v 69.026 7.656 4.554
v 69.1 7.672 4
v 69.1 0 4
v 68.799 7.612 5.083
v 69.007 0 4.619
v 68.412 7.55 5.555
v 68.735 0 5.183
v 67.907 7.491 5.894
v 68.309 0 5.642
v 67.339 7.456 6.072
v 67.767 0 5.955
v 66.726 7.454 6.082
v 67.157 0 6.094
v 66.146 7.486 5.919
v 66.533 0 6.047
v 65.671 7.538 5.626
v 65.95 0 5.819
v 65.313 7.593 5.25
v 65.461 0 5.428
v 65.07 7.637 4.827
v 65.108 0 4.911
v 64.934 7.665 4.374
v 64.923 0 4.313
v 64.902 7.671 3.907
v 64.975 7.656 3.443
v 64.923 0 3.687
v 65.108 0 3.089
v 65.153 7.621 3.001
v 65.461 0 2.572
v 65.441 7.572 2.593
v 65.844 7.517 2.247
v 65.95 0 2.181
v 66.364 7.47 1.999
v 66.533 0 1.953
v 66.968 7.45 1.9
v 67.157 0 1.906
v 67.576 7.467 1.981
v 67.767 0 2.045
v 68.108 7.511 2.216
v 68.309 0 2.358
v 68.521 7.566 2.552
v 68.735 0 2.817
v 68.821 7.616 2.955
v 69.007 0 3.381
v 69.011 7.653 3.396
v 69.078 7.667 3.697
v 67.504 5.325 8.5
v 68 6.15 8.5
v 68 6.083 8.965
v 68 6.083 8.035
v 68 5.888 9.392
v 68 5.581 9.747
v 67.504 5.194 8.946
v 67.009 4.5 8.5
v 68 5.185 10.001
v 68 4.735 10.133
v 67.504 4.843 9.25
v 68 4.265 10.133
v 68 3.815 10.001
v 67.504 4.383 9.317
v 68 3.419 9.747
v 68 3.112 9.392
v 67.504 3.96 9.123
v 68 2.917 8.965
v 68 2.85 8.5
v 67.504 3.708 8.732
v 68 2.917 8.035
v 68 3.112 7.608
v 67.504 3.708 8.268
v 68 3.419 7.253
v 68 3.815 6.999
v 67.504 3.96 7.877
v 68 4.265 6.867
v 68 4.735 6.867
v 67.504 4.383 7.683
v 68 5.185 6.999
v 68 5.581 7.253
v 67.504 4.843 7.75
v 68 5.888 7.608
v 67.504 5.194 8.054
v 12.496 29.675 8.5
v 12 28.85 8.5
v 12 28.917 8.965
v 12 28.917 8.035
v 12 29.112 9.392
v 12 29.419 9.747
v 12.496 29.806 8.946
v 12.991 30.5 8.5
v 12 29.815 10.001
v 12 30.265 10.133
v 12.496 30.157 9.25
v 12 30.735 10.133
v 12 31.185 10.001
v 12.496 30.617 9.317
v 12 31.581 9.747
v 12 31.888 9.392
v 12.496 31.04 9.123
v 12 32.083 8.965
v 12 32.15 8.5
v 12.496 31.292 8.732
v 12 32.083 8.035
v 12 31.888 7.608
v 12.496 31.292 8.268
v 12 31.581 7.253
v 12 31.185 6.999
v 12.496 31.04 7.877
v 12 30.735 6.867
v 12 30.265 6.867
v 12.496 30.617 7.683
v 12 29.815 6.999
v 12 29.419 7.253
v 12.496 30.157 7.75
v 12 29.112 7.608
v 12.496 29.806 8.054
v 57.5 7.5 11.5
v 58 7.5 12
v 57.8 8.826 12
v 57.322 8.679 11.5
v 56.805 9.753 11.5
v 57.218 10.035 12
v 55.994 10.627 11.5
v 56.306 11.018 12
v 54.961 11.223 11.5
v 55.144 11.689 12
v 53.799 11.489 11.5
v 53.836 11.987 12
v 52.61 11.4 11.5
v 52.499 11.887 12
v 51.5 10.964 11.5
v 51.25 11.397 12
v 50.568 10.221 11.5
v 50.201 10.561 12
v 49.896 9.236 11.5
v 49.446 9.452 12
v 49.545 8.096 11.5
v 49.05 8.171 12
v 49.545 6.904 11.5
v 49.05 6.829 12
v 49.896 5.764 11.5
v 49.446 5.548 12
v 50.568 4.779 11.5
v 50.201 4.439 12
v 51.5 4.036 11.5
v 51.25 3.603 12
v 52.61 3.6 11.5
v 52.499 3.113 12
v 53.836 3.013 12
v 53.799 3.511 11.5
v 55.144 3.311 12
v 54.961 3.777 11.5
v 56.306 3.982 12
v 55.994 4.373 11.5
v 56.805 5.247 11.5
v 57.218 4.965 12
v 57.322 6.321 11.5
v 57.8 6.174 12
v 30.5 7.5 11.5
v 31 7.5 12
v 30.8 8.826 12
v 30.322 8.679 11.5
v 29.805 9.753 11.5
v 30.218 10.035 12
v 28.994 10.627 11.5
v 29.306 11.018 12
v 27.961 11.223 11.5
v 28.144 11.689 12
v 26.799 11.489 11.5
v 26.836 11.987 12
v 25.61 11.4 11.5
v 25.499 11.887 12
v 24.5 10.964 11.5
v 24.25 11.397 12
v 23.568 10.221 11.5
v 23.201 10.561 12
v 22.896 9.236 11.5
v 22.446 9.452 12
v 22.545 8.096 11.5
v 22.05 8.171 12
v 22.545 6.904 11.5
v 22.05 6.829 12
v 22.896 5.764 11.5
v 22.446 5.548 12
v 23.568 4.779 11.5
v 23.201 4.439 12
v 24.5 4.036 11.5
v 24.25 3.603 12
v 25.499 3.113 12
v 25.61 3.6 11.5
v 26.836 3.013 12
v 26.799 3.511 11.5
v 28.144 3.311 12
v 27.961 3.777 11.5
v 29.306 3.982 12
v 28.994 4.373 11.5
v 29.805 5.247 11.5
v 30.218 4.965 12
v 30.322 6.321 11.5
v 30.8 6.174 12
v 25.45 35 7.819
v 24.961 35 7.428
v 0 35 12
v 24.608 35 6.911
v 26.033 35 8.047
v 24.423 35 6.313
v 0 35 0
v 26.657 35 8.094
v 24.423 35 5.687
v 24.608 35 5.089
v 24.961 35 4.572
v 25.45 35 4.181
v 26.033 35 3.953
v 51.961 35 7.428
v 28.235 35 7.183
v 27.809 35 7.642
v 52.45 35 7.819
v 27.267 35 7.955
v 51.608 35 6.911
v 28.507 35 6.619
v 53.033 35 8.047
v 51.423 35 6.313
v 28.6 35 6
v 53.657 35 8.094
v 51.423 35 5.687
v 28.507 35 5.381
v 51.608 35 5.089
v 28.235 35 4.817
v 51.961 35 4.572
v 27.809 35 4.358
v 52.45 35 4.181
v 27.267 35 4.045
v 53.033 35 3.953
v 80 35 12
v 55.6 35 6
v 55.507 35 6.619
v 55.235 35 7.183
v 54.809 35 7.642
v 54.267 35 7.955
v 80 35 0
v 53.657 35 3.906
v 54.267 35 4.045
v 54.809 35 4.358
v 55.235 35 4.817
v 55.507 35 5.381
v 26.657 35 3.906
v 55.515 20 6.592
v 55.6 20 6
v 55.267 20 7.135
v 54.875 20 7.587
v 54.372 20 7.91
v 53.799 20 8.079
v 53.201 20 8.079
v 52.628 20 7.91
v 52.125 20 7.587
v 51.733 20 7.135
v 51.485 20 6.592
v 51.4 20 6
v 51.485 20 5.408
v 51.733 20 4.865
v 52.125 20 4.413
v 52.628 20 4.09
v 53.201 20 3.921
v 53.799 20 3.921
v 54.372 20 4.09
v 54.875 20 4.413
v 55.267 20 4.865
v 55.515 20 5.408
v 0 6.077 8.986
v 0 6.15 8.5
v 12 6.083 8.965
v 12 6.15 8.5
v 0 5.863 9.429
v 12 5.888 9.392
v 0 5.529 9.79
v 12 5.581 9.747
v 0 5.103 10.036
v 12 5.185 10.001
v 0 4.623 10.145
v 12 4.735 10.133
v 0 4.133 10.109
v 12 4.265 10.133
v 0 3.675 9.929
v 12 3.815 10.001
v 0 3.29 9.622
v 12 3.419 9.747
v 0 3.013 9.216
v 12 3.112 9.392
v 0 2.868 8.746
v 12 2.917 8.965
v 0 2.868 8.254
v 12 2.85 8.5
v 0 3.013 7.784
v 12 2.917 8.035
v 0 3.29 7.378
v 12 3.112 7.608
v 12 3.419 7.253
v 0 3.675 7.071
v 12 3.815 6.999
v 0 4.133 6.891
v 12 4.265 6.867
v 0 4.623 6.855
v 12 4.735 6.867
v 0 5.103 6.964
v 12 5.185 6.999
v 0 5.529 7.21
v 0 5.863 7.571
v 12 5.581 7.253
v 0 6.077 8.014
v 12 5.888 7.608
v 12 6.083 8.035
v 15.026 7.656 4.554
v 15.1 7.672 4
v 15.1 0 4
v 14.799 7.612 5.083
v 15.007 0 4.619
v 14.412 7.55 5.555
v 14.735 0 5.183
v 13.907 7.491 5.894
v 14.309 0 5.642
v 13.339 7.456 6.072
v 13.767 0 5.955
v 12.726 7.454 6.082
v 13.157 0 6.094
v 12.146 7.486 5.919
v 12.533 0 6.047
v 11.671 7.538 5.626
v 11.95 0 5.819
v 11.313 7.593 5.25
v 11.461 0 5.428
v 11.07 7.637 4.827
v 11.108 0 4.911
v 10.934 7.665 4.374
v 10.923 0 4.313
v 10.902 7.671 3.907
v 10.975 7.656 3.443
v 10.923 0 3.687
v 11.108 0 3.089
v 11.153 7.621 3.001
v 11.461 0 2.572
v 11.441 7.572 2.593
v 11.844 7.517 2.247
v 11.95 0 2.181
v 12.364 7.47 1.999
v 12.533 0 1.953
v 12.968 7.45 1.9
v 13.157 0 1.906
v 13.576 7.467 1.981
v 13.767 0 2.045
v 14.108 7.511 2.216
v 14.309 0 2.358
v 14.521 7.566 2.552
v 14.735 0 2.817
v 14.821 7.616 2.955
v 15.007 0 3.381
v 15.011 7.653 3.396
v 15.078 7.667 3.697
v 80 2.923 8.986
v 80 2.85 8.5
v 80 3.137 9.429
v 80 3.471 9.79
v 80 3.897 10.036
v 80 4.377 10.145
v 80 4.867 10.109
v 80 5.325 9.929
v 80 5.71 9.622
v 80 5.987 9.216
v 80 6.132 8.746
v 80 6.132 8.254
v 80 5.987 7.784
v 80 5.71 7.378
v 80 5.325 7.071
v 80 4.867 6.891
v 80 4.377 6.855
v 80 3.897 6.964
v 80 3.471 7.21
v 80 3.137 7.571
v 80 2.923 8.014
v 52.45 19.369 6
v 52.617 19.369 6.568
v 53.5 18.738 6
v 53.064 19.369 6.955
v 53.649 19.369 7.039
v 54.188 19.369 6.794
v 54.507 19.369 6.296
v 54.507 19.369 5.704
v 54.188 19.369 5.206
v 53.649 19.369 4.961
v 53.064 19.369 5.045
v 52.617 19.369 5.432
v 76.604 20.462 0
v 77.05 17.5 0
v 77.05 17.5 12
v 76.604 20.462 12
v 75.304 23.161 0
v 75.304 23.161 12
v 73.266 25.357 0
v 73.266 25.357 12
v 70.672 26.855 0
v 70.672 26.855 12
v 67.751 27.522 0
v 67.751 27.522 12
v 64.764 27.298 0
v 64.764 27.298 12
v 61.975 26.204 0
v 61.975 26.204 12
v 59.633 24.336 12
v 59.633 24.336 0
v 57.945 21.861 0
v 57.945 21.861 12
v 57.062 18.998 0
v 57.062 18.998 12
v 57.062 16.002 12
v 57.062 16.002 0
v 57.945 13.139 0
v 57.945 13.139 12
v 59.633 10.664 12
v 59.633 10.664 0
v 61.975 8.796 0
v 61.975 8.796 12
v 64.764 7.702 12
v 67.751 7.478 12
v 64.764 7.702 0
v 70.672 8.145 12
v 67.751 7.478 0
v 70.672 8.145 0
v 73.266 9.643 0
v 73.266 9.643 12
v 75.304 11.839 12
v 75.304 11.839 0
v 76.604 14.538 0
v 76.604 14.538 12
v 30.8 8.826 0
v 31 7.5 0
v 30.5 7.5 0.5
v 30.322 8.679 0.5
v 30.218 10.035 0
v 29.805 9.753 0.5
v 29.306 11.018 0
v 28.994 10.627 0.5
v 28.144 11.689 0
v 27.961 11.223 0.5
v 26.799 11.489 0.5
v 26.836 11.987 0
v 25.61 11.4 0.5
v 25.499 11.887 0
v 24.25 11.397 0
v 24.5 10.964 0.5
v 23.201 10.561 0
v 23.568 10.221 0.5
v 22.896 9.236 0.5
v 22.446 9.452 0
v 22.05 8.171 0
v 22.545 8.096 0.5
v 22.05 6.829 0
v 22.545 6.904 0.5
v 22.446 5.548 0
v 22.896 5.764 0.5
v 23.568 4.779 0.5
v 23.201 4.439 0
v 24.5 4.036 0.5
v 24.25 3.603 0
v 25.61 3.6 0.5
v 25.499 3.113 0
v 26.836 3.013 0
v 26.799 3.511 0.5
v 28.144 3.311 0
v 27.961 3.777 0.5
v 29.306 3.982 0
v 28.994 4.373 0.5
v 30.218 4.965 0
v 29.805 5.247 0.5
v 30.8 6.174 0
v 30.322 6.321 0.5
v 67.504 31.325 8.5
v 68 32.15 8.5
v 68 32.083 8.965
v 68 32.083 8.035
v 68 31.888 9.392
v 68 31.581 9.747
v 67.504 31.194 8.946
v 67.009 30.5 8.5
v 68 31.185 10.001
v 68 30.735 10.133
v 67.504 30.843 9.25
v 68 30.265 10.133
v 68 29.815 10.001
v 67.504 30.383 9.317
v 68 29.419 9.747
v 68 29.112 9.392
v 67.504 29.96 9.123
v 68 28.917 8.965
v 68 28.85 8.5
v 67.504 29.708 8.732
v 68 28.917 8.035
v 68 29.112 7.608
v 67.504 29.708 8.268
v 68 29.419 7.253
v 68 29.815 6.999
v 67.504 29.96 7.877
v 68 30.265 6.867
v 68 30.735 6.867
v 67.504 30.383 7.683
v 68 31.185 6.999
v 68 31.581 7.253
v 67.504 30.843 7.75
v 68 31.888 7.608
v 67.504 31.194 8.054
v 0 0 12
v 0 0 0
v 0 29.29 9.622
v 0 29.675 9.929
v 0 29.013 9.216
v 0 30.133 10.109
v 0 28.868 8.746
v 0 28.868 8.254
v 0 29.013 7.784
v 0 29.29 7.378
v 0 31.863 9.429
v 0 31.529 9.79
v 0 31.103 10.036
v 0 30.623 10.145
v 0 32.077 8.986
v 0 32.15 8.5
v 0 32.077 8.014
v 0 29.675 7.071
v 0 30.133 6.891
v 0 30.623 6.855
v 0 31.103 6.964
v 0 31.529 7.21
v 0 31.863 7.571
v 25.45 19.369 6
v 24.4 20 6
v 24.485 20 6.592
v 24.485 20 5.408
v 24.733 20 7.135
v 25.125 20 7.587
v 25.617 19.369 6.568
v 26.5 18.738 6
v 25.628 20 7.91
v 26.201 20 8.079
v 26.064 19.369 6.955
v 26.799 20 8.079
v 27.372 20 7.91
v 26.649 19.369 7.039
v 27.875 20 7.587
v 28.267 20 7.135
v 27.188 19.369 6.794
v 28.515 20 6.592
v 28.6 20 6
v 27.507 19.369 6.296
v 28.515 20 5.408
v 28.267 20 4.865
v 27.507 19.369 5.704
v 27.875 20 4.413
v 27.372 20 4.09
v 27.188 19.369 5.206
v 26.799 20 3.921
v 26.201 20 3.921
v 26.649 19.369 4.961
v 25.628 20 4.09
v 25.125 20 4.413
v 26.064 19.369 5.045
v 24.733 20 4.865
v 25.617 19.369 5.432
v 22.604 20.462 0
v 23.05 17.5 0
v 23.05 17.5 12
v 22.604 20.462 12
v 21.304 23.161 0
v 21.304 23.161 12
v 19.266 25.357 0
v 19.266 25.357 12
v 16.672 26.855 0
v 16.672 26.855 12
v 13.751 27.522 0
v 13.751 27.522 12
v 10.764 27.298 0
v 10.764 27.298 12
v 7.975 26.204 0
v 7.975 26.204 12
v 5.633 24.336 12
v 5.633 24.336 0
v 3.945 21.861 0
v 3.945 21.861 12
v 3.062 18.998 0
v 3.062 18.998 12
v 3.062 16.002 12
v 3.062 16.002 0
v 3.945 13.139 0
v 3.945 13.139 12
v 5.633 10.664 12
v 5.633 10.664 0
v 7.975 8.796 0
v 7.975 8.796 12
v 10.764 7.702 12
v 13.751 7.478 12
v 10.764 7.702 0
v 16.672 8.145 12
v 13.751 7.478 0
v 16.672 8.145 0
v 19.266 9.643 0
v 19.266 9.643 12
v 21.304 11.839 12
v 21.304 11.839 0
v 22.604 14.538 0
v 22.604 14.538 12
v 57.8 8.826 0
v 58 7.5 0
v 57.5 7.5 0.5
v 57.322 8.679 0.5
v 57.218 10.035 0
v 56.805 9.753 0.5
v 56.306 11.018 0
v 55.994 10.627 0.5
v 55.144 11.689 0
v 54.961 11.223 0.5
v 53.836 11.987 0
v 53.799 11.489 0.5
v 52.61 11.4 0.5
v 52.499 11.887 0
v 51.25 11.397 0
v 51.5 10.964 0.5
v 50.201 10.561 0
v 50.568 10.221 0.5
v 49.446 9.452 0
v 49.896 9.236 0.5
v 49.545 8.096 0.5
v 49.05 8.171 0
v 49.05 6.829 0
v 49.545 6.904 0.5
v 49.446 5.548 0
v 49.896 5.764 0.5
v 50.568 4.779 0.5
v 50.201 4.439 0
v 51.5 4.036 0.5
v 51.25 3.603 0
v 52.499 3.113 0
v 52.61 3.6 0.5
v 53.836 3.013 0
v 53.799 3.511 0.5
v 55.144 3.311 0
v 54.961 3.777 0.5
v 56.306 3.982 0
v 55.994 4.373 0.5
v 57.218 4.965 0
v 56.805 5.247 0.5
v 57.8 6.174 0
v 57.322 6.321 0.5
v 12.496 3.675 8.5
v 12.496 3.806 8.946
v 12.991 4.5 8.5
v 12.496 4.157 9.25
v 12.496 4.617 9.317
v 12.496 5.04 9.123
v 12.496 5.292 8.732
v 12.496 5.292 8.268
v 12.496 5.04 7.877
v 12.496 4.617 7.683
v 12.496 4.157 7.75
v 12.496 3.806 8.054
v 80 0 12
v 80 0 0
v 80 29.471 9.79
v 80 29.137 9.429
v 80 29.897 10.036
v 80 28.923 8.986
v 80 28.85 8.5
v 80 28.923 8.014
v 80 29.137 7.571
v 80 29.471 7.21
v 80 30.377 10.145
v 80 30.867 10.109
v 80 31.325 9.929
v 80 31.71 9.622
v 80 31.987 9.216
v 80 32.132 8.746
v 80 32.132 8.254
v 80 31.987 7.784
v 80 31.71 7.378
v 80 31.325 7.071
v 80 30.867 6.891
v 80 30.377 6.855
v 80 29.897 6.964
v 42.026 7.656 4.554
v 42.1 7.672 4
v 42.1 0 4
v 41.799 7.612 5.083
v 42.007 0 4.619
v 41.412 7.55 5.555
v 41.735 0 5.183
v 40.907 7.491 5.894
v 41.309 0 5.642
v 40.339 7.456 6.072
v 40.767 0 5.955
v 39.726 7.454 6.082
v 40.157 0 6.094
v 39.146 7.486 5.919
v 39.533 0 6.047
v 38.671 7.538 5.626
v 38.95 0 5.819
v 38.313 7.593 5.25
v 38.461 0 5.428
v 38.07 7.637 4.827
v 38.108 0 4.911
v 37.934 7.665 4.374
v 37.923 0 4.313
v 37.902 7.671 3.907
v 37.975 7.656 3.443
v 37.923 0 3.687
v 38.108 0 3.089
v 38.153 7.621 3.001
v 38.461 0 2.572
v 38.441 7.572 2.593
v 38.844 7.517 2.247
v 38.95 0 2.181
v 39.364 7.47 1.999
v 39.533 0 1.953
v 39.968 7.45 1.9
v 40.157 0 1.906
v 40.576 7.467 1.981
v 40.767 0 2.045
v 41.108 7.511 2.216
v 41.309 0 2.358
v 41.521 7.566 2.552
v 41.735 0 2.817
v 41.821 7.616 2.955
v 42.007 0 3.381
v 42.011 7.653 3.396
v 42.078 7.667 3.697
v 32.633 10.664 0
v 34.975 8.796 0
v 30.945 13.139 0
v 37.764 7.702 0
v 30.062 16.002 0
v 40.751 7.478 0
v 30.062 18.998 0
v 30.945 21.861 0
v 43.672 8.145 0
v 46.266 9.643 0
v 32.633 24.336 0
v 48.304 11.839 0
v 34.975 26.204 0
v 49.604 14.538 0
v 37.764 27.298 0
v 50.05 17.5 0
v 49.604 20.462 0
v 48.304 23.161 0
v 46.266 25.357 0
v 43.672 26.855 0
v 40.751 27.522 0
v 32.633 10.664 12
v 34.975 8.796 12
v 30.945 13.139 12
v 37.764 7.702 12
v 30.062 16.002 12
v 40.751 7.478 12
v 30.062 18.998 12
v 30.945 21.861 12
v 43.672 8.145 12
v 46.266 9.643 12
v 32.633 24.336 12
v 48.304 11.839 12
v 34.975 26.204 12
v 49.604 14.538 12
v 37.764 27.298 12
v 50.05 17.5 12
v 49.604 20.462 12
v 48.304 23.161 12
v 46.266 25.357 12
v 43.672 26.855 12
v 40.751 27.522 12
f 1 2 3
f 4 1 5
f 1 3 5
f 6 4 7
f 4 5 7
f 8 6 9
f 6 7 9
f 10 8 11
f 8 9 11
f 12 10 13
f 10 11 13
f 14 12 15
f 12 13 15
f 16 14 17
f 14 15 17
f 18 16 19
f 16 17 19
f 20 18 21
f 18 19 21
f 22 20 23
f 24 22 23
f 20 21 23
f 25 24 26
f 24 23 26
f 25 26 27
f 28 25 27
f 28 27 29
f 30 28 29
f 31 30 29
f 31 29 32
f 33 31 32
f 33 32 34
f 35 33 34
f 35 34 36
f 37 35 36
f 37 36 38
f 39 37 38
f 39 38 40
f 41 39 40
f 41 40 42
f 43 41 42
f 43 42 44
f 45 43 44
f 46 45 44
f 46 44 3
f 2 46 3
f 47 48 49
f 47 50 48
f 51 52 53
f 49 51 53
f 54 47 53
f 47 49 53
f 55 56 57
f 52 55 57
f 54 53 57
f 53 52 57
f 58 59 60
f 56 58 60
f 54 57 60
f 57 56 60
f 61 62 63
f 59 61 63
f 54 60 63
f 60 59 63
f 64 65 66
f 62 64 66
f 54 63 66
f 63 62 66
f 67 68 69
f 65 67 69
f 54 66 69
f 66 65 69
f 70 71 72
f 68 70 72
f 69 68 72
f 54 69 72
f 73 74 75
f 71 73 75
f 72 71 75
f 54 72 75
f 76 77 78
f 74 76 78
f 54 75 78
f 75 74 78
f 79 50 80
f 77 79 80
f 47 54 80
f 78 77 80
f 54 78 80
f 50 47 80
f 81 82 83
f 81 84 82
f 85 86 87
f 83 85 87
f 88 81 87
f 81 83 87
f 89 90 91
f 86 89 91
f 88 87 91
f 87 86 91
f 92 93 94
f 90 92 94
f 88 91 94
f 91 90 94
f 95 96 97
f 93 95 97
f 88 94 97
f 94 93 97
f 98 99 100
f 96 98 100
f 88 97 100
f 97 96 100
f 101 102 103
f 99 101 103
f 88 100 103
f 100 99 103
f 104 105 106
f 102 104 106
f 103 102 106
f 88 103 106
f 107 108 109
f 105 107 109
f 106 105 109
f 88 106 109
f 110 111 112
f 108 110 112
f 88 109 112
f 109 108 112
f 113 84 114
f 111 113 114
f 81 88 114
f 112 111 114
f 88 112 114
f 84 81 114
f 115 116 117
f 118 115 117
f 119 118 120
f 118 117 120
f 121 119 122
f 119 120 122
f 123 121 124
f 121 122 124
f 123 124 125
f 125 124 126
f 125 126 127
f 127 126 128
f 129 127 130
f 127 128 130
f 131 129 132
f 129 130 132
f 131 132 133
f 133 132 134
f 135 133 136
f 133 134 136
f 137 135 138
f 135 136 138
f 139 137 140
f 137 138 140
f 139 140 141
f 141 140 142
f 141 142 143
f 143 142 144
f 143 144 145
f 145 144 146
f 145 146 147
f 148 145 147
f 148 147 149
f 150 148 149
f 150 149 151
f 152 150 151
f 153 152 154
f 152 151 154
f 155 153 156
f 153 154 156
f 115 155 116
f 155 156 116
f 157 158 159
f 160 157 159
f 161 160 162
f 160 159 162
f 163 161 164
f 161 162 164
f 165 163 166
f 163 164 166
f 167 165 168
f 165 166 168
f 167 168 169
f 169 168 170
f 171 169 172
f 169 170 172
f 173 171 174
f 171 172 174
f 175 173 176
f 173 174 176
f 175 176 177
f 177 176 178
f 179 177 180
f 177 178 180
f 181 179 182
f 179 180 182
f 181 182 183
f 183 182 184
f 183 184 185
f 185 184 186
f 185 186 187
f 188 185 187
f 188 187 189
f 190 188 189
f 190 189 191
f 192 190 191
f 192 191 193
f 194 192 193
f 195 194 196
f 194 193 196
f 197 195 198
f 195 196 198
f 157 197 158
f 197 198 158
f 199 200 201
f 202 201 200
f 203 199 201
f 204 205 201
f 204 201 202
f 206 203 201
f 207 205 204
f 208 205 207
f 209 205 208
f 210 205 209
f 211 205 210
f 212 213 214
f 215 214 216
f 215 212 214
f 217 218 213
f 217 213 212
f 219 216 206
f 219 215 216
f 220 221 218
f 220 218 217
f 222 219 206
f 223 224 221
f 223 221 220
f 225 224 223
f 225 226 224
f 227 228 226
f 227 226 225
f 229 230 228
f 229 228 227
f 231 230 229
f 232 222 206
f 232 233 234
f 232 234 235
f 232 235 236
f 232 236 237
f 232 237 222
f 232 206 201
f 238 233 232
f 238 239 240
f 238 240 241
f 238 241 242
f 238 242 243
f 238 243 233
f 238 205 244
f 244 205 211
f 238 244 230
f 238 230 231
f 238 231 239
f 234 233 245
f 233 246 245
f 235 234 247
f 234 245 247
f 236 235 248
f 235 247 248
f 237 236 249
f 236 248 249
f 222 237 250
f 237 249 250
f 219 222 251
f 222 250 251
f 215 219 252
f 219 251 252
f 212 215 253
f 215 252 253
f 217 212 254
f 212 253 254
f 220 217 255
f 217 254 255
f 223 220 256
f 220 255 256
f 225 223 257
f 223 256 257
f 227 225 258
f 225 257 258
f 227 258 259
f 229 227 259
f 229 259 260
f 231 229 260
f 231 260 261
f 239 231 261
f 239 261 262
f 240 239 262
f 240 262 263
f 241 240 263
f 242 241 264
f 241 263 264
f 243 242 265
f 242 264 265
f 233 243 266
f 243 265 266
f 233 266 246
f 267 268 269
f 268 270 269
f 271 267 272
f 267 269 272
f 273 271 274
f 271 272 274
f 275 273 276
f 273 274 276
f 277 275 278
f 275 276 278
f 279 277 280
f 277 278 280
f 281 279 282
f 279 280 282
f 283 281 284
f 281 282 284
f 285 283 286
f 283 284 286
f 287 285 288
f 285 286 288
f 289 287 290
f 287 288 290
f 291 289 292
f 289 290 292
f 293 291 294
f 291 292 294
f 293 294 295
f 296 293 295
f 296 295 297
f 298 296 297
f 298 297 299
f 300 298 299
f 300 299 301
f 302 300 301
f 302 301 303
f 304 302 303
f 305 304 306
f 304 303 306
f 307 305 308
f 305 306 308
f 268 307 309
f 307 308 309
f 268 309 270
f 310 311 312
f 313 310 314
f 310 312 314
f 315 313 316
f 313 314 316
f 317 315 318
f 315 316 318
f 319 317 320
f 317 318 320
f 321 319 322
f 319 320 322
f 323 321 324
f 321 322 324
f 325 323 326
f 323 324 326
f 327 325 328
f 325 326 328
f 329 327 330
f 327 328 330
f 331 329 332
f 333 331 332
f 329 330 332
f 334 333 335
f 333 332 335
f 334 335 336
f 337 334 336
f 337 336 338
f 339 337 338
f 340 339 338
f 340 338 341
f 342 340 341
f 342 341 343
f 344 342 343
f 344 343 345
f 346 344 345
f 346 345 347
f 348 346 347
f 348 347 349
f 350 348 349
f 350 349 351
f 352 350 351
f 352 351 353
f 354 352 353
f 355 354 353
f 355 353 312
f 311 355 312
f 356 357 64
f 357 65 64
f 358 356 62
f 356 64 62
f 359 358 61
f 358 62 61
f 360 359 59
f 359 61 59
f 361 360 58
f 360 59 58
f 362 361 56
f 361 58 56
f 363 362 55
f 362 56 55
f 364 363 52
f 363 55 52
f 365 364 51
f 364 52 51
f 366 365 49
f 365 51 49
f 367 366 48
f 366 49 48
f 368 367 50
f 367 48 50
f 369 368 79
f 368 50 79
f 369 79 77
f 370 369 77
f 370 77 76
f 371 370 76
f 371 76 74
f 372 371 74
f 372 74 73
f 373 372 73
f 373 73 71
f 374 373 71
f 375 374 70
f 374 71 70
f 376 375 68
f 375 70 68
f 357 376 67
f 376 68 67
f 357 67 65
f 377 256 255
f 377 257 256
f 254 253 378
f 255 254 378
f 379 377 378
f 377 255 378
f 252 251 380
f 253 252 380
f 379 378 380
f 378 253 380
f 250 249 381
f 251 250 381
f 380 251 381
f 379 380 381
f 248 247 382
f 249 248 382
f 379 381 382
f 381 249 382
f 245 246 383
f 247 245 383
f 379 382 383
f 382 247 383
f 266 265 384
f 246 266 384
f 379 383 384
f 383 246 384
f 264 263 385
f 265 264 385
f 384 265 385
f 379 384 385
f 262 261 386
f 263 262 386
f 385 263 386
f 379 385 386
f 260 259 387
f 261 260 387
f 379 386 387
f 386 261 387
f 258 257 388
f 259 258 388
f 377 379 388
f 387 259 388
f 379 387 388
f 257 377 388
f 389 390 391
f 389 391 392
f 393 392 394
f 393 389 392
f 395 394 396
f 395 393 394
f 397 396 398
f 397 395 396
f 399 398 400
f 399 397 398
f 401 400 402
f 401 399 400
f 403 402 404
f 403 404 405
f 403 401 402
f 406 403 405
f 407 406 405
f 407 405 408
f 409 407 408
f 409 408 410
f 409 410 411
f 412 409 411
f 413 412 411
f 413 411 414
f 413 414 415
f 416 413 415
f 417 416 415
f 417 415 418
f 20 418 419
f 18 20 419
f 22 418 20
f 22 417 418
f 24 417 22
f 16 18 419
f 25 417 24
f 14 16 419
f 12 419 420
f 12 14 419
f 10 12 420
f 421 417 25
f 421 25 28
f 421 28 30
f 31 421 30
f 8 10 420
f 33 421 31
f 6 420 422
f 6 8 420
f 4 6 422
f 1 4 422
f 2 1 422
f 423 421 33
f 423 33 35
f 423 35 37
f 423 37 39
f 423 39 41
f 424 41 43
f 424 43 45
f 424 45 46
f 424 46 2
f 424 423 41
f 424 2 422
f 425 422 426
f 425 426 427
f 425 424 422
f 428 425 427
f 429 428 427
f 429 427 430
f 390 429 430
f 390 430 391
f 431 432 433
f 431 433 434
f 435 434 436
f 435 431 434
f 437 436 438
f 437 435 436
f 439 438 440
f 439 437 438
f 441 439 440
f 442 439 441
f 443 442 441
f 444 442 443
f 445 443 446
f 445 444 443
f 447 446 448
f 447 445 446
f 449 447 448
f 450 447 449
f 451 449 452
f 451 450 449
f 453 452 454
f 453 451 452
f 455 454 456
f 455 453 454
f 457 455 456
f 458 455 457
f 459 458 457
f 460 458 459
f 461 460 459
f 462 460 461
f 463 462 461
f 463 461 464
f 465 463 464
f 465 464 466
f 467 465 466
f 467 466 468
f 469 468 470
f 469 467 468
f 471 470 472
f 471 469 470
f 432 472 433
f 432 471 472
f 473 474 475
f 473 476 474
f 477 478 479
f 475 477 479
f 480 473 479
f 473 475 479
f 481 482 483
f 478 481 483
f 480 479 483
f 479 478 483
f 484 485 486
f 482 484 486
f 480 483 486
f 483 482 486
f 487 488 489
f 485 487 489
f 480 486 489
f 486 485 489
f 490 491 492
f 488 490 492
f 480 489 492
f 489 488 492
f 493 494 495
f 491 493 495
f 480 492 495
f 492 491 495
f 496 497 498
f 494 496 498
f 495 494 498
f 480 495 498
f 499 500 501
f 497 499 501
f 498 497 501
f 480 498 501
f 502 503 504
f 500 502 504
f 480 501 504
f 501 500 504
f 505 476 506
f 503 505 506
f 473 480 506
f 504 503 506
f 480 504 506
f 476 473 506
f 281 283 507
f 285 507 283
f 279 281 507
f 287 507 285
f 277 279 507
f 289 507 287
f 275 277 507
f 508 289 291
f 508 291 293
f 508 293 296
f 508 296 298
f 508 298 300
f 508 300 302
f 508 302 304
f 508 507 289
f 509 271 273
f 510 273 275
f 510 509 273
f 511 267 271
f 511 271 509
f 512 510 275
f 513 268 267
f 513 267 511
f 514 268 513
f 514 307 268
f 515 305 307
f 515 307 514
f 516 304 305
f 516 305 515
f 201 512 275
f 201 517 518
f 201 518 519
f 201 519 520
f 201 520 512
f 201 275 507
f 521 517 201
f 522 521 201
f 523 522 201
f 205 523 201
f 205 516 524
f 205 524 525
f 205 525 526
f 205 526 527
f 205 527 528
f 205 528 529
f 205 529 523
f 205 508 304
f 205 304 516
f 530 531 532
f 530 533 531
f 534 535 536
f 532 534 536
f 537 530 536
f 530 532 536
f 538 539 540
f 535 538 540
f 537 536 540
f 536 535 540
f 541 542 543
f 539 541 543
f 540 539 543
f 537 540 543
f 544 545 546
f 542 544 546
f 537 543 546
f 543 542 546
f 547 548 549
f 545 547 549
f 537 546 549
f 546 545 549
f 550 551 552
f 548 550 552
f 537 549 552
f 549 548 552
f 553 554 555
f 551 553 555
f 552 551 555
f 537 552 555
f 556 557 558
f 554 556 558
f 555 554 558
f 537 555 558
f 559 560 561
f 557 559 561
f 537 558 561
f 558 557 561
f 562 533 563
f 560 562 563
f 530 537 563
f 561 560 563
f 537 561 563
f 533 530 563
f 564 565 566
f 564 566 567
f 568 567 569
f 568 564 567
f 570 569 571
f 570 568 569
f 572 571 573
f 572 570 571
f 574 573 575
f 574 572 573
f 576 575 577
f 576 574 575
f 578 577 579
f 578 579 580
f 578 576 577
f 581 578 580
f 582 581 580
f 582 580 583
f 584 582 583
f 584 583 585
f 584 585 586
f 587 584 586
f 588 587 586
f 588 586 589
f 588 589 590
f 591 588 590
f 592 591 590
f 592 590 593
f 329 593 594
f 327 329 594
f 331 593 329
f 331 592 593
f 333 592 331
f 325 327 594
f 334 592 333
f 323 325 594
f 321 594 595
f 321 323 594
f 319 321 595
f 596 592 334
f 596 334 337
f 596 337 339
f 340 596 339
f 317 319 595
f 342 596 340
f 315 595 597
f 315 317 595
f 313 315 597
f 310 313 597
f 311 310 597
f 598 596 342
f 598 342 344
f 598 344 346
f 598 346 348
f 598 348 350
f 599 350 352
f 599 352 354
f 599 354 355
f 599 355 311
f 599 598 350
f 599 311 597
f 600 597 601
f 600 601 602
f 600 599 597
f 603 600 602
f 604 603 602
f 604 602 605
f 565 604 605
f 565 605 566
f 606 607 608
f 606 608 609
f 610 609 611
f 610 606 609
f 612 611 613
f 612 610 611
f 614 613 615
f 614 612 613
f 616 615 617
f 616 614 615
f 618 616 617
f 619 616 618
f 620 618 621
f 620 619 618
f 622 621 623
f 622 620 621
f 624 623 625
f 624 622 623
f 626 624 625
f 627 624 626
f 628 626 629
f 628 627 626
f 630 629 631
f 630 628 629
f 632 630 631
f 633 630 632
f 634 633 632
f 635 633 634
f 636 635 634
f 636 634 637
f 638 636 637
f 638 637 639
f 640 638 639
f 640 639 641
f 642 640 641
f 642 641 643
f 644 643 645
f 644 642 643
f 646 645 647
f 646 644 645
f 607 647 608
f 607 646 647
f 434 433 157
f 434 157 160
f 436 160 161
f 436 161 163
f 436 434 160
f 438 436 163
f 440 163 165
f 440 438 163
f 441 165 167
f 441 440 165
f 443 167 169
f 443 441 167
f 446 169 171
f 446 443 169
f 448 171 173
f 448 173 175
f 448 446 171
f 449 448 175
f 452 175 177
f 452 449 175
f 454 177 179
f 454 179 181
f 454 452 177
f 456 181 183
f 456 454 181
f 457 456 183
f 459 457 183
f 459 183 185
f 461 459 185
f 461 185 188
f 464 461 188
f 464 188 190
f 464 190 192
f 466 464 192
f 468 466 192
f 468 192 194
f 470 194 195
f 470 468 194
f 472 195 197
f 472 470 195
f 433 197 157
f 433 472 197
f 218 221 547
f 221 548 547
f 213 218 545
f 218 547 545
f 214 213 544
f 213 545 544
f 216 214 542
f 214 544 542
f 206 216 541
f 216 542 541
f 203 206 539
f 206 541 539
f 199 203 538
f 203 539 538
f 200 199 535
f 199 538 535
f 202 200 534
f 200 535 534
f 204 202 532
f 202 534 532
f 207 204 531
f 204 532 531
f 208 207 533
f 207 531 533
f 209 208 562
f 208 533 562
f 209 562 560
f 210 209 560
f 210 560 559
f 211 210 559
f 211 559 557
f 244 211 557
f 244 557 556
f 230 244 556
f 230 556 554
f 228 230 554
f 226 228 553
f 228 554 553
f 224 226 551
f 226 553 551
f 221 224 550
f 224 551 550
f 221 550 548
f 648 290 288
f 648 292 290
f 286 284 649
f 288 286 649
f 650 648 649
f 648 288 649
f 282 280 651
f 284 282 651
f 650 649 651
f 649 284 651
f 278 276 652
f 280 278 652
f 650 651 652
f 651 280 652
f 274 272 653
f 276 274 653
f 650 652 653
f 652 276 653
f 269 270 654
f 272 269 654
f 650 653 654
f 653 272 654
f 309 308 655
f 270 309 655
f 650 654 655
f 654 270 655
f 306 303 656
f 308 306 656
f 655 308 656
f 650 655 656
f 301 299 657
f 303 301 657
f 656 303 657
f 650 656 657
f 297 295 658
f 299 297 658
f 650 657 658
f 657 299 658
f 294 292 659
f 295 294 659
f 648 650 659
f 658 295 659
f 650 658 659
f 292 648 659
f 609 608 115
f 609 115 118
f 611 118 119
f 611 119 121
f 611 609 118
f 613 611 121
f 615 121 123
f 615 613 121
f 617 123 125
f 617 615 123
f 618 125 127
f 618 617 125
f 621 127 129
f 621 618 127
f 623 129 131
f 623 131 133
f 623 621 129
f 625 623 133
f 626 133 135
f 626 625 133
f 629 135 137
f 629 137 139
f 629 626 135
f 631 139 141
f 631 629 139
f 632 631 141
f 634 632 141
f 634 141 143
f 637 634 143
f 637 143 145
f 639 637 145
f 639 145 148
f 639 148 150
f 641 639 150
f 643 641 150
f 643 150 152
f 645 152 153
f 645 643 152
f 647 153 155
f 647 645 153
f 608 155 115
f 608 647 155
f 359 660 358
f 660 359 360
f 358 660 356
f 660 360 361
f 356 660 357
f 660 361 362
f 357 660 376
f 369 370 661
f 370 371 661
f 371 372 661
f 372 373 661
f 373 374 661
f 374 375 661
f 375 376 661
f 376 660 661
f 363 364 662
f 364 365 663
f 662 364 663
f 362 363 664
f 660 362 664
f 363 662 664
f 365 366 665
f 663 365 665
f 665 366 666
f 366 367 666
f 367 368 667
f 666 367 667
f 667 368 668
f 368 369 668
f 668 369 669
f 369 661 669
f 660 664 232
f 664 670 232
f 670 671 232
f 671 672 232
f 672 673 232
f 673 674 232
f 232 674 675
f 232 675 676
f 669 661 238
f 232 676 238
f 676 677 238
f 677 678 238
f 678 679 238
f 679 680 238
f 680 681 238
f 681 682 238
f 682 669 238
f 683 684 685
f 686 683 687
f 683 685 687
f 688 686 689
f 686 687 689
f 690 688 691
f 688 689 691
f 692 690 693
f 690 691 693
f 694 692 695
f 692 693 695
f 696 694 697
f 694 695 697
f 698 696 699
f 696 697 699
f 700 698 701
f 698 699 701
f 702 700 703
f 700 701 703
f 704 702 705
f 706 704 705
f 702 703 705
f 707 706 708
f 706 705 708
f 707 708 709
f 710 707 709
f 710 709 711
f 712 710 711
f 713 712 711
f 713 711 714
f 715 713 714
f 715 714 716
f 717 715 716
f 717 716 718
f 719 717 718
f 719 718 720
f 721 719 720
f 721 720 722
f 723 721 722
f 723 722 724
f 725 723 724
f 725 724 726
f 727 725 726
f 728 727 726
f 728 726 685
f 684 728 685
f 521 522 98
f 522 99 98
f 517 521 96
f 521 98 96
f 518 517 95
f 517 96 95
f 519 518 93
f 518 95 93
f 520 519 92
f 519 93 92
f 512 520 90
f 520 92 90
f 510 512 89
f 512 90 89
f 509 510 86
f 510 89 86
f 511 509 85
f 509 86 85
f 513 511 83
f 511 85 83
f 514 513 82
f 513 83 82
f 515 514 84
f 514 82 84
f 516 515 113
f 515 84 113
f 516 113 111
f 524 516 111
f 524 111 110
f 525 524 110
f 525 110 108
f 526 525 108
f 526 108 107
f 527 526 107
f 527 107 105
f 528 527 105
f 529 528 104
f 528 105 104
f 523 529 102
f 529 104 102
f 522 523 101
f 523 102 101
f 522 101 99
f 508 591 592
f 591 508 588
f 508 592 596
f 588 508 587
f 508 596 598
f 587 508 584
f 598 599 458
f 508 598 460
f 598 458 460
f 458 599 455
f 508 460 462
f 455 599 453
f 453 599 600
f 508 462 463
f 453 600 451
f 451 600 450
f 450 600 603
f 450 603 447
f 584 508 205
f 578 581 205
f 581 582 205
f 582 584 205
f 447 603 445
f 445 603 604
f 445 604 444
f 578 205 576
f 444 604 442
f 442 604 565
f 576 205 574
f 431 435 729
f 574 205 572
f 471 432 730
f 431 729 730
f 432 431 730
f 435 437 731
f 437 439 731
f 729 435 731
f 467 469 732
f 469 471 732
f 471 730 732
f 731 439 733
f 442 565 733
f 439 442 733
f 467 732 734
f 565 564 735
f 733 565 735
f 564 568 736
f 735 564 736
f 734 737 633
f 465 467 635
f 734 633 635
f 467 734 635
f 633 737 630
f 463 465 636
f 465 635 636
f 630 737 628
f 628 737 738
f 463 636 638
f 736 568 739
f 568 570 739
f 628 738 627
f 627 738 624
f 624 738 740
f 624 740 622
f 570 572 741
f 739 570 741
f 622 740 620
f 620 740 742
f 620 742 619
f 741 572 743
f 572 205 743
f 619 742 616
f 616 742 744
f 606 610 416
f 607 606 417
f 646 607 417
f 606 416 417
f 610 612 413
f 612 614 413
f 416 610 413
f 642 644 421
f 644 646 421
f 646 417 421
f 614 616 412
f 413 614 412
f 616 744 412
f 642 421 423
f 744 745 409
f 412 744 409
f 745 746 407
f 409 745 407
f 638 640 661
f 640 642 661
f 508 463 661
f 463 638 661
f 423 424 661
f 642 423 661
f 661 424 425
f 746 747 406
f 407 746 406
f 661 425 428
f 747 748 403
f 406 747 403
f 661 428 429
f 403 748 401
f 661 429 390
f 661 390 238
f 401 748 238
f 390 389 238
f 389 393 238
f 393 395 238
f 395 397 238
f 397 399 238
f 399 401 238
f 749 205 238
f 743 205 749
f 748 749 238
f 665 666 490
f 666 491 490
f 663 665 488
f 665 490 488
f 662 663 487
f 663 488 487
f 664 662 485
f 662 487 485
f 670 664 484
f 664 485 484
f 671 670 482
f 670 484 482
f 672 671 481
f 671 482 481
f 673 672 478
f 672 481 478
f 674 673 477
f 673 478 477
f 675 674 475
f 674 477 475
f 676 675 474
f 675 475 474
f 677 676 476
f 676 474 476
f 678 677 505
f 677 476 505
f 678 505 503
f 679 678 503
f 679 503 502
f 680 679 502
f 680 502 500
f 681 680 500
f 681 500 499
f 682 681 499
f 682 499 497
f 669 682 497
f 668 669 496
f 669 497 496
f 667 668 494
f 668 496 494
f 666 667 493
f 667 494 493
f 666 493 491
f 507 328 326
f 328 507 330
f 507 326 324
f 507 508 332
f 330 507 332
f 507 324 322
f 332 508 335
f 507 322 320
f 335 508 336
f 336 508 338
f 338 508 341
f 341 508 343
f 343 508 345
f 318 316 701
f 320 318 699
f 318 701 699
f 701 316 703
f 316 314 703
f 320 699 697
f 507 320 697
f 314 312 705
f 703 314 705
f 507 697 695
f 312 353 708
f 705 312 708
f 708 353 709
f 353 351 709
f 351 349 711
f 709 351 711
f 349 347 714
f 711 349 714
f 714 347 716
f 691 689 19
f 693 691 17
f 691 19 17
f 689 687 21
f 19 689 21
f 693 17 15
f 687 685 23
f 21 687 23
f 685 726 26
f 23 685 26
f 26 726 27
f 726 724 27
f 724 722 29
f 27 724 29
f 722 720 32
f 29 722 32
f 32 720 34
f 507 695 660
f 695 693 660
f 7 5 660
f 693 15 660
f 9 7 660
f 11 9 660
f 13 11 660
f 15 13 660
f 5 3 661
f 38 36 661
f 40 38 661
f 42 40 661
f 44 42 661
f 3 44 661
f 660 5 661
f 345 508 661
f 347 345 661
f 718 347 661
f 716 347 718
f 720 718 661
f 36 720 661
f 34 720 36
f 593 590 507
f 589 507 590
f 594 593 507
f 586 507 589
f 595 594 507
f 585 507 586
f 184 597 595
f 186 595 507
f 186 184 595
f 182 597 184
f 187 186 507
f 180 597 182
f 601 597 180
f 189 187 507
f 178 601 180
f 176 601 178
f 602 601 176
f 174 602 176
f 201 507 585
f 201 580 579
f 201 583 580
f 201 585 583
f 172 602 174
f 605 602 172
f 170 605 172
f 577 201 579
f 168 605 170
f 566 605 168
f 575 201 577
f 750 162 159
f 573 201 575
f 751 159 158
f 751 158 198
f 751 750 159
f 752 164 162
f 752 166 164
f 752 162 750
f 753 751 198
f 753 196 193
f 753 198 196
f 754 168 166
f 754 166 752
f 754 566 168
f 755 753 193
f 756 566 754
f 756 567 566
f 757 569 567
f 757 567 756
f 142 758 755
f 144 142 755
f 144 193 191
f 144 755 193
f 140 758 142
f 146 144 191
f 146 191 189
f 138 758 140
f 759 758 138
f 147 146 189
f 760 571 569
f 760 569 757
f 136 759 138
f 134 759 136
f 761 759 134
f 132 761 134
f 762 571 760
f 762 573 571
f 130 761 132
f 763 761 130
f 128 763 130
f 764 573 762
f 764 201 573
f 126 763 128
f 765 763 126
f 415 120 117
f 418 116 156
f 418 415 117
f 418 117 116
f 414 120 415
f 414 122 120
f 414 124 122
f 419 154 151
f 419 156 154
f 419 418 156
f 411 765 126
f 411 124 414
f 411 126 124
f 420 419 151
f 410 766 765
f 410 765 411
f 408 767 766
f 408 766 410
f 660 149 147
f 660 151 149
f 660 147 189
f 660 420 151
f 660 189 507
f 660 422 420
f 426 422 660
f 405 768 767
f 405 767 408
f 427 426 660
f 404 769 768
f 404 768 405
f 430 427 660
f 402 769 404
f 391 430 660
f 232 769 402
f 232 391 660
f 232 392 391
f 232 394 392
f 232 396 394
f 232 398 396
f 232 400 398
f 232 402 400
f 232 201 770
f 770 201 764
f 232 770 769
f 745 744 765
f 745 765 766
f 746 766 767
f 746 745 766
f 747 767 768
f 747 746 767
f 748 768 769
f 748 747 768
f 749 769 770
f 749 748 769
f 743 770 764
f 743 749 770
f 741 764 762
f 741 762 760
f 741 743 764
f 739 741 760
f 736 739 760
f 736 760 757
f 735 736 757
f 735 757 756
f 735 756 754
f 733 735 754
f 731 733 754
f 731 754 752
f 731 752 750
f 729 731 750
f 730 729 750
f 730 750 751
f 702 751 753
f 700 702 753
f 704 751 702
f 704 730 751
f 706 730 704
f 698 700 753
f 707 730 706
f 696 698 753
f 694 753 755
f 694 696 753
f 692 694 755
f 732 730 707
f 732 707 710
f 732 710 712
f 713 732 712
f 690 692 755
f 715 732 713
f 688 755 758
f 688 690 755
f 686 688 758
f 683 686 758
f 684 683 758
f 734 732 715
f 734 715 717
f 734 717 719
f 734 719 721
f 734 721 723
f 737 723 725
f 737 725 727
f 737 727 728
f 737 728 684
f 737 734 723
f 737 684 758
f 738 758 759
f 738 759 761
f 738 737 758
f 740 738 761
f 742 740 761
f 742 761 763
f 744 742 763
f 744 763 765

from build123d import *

# Parameters (mm, degrees)
F0_W      = 80
F0_H      = 35
F0_R      = 4
F0_R_2    = 10.05
F1_DEPTH  = 12
F2_SIZE   = 0.5
F3_R      = 2.1
F4_DEPTH  = 7.6728517519
F6_D      = 4.2
F6_DEPTH  = 15
F6_TIP    = 1.2618073
F8_D      = 3.3
F8_DEPTH  = 12
F8_TIP    = 0.9914200214
F10_D     = 3.3
F10_DEPTH = 12
F10_TIP   = 0.9914200214


with BuildPart() as f1:
    # F0 (on Top) → F1 (new body)
    with BuildSketch(Plane.XY):
        with Locations((40, 17.5)):
            Rectangle(F0_W, F0_H)
        with Locations((26.5, 7.5)):
            Circle(F0_R, mode=Mode.SUBTRACT)
        with Locations((53.5, 7.5)):
            Circle(F0_R, mode=Mode.SUBTRACT)
        with Locations((13, 17.5)):
            Circle(F0_R_2, mode=Mode.SUBTRACT)
        with Locations((40, 17.5)):
            Circle(F0_R_2, mode=Mode.SUBTRACT)
        with Locations((67, 17.5)):
            Circle(F0_R_2, mode=Mode.SUBTRACT)
    extrude(amount=F1_DEPTH)

    # F2
    f2_edges = [f1.edges().sort_by_distance(p)[0] for p in [
        (22.5, 7.5, 12),
        (49.5, 7.5, 12),
        (49.5, 7.5, 0),
        (22.5, 7.5, 0),
    ]]
    chamfer(f2_edges, length=F2_SIZE)

    # F3 (on face) → F4 (cut, through all)
    with BuildSketch(Plane.XZ):
        with Locations((40, 4)):
            Circle(F3_R)
        with Locations((67, 4)):
            Circle(F3_R)
        with Locations((13, 4)):
            Circle(F3_R)
    extrude(amount=-F4_DEPTH, mode=Mode.SUBTRACT)

    # F6
    with Locations(Plane(origin=(0, 35, 0), x_dir=(-1, 0, 0), z_dir=(0, 1, 0))):
        with Locations((-53.5, 6), (-26.5, 6)):
            Hole(F6_D / 2, depth=F6_DEPTH)
            with Locations((0, 0, -(F6_DEPTH + F6_TIP / 2))):  # 118° drill point
                Cone(0, F6_D / 2, F6_TIP, mode=Mode.SUBTRACT)

    # F8
    with Locations(Plane.YZ.offset(80)):
        with Locations((4.5, 8.5), (30.5, 8.5)):
            Hole(F8_D / 2, depth=F8_DEPTH)
            with Locations((0, 0, -(F8_DEPTH + F8_TIP / 2))):  # 118° drill point
                Cone(0, F8_D / 2, F8_TIP, mode=Mode.SUBTRACT)

    # F10
    with Locations(Plane(origin=(0, 0, 0), x_dir=(0, -1, 0), z_dir=(-1, 0, 0))):
        with Locations((-30.5, 8.5), (-4.5, 8.5)):
            Hole(F10_D / 2, depth=F10_DEPTH)
            with Locations((0, 0, -(F10_DEPTH + F10_TIP / 2))):  # 118° drill point
                Cone(0, F10_D / 2, F10_TIP, mode=Mode.SUBTRACT)


solid = f1.part
